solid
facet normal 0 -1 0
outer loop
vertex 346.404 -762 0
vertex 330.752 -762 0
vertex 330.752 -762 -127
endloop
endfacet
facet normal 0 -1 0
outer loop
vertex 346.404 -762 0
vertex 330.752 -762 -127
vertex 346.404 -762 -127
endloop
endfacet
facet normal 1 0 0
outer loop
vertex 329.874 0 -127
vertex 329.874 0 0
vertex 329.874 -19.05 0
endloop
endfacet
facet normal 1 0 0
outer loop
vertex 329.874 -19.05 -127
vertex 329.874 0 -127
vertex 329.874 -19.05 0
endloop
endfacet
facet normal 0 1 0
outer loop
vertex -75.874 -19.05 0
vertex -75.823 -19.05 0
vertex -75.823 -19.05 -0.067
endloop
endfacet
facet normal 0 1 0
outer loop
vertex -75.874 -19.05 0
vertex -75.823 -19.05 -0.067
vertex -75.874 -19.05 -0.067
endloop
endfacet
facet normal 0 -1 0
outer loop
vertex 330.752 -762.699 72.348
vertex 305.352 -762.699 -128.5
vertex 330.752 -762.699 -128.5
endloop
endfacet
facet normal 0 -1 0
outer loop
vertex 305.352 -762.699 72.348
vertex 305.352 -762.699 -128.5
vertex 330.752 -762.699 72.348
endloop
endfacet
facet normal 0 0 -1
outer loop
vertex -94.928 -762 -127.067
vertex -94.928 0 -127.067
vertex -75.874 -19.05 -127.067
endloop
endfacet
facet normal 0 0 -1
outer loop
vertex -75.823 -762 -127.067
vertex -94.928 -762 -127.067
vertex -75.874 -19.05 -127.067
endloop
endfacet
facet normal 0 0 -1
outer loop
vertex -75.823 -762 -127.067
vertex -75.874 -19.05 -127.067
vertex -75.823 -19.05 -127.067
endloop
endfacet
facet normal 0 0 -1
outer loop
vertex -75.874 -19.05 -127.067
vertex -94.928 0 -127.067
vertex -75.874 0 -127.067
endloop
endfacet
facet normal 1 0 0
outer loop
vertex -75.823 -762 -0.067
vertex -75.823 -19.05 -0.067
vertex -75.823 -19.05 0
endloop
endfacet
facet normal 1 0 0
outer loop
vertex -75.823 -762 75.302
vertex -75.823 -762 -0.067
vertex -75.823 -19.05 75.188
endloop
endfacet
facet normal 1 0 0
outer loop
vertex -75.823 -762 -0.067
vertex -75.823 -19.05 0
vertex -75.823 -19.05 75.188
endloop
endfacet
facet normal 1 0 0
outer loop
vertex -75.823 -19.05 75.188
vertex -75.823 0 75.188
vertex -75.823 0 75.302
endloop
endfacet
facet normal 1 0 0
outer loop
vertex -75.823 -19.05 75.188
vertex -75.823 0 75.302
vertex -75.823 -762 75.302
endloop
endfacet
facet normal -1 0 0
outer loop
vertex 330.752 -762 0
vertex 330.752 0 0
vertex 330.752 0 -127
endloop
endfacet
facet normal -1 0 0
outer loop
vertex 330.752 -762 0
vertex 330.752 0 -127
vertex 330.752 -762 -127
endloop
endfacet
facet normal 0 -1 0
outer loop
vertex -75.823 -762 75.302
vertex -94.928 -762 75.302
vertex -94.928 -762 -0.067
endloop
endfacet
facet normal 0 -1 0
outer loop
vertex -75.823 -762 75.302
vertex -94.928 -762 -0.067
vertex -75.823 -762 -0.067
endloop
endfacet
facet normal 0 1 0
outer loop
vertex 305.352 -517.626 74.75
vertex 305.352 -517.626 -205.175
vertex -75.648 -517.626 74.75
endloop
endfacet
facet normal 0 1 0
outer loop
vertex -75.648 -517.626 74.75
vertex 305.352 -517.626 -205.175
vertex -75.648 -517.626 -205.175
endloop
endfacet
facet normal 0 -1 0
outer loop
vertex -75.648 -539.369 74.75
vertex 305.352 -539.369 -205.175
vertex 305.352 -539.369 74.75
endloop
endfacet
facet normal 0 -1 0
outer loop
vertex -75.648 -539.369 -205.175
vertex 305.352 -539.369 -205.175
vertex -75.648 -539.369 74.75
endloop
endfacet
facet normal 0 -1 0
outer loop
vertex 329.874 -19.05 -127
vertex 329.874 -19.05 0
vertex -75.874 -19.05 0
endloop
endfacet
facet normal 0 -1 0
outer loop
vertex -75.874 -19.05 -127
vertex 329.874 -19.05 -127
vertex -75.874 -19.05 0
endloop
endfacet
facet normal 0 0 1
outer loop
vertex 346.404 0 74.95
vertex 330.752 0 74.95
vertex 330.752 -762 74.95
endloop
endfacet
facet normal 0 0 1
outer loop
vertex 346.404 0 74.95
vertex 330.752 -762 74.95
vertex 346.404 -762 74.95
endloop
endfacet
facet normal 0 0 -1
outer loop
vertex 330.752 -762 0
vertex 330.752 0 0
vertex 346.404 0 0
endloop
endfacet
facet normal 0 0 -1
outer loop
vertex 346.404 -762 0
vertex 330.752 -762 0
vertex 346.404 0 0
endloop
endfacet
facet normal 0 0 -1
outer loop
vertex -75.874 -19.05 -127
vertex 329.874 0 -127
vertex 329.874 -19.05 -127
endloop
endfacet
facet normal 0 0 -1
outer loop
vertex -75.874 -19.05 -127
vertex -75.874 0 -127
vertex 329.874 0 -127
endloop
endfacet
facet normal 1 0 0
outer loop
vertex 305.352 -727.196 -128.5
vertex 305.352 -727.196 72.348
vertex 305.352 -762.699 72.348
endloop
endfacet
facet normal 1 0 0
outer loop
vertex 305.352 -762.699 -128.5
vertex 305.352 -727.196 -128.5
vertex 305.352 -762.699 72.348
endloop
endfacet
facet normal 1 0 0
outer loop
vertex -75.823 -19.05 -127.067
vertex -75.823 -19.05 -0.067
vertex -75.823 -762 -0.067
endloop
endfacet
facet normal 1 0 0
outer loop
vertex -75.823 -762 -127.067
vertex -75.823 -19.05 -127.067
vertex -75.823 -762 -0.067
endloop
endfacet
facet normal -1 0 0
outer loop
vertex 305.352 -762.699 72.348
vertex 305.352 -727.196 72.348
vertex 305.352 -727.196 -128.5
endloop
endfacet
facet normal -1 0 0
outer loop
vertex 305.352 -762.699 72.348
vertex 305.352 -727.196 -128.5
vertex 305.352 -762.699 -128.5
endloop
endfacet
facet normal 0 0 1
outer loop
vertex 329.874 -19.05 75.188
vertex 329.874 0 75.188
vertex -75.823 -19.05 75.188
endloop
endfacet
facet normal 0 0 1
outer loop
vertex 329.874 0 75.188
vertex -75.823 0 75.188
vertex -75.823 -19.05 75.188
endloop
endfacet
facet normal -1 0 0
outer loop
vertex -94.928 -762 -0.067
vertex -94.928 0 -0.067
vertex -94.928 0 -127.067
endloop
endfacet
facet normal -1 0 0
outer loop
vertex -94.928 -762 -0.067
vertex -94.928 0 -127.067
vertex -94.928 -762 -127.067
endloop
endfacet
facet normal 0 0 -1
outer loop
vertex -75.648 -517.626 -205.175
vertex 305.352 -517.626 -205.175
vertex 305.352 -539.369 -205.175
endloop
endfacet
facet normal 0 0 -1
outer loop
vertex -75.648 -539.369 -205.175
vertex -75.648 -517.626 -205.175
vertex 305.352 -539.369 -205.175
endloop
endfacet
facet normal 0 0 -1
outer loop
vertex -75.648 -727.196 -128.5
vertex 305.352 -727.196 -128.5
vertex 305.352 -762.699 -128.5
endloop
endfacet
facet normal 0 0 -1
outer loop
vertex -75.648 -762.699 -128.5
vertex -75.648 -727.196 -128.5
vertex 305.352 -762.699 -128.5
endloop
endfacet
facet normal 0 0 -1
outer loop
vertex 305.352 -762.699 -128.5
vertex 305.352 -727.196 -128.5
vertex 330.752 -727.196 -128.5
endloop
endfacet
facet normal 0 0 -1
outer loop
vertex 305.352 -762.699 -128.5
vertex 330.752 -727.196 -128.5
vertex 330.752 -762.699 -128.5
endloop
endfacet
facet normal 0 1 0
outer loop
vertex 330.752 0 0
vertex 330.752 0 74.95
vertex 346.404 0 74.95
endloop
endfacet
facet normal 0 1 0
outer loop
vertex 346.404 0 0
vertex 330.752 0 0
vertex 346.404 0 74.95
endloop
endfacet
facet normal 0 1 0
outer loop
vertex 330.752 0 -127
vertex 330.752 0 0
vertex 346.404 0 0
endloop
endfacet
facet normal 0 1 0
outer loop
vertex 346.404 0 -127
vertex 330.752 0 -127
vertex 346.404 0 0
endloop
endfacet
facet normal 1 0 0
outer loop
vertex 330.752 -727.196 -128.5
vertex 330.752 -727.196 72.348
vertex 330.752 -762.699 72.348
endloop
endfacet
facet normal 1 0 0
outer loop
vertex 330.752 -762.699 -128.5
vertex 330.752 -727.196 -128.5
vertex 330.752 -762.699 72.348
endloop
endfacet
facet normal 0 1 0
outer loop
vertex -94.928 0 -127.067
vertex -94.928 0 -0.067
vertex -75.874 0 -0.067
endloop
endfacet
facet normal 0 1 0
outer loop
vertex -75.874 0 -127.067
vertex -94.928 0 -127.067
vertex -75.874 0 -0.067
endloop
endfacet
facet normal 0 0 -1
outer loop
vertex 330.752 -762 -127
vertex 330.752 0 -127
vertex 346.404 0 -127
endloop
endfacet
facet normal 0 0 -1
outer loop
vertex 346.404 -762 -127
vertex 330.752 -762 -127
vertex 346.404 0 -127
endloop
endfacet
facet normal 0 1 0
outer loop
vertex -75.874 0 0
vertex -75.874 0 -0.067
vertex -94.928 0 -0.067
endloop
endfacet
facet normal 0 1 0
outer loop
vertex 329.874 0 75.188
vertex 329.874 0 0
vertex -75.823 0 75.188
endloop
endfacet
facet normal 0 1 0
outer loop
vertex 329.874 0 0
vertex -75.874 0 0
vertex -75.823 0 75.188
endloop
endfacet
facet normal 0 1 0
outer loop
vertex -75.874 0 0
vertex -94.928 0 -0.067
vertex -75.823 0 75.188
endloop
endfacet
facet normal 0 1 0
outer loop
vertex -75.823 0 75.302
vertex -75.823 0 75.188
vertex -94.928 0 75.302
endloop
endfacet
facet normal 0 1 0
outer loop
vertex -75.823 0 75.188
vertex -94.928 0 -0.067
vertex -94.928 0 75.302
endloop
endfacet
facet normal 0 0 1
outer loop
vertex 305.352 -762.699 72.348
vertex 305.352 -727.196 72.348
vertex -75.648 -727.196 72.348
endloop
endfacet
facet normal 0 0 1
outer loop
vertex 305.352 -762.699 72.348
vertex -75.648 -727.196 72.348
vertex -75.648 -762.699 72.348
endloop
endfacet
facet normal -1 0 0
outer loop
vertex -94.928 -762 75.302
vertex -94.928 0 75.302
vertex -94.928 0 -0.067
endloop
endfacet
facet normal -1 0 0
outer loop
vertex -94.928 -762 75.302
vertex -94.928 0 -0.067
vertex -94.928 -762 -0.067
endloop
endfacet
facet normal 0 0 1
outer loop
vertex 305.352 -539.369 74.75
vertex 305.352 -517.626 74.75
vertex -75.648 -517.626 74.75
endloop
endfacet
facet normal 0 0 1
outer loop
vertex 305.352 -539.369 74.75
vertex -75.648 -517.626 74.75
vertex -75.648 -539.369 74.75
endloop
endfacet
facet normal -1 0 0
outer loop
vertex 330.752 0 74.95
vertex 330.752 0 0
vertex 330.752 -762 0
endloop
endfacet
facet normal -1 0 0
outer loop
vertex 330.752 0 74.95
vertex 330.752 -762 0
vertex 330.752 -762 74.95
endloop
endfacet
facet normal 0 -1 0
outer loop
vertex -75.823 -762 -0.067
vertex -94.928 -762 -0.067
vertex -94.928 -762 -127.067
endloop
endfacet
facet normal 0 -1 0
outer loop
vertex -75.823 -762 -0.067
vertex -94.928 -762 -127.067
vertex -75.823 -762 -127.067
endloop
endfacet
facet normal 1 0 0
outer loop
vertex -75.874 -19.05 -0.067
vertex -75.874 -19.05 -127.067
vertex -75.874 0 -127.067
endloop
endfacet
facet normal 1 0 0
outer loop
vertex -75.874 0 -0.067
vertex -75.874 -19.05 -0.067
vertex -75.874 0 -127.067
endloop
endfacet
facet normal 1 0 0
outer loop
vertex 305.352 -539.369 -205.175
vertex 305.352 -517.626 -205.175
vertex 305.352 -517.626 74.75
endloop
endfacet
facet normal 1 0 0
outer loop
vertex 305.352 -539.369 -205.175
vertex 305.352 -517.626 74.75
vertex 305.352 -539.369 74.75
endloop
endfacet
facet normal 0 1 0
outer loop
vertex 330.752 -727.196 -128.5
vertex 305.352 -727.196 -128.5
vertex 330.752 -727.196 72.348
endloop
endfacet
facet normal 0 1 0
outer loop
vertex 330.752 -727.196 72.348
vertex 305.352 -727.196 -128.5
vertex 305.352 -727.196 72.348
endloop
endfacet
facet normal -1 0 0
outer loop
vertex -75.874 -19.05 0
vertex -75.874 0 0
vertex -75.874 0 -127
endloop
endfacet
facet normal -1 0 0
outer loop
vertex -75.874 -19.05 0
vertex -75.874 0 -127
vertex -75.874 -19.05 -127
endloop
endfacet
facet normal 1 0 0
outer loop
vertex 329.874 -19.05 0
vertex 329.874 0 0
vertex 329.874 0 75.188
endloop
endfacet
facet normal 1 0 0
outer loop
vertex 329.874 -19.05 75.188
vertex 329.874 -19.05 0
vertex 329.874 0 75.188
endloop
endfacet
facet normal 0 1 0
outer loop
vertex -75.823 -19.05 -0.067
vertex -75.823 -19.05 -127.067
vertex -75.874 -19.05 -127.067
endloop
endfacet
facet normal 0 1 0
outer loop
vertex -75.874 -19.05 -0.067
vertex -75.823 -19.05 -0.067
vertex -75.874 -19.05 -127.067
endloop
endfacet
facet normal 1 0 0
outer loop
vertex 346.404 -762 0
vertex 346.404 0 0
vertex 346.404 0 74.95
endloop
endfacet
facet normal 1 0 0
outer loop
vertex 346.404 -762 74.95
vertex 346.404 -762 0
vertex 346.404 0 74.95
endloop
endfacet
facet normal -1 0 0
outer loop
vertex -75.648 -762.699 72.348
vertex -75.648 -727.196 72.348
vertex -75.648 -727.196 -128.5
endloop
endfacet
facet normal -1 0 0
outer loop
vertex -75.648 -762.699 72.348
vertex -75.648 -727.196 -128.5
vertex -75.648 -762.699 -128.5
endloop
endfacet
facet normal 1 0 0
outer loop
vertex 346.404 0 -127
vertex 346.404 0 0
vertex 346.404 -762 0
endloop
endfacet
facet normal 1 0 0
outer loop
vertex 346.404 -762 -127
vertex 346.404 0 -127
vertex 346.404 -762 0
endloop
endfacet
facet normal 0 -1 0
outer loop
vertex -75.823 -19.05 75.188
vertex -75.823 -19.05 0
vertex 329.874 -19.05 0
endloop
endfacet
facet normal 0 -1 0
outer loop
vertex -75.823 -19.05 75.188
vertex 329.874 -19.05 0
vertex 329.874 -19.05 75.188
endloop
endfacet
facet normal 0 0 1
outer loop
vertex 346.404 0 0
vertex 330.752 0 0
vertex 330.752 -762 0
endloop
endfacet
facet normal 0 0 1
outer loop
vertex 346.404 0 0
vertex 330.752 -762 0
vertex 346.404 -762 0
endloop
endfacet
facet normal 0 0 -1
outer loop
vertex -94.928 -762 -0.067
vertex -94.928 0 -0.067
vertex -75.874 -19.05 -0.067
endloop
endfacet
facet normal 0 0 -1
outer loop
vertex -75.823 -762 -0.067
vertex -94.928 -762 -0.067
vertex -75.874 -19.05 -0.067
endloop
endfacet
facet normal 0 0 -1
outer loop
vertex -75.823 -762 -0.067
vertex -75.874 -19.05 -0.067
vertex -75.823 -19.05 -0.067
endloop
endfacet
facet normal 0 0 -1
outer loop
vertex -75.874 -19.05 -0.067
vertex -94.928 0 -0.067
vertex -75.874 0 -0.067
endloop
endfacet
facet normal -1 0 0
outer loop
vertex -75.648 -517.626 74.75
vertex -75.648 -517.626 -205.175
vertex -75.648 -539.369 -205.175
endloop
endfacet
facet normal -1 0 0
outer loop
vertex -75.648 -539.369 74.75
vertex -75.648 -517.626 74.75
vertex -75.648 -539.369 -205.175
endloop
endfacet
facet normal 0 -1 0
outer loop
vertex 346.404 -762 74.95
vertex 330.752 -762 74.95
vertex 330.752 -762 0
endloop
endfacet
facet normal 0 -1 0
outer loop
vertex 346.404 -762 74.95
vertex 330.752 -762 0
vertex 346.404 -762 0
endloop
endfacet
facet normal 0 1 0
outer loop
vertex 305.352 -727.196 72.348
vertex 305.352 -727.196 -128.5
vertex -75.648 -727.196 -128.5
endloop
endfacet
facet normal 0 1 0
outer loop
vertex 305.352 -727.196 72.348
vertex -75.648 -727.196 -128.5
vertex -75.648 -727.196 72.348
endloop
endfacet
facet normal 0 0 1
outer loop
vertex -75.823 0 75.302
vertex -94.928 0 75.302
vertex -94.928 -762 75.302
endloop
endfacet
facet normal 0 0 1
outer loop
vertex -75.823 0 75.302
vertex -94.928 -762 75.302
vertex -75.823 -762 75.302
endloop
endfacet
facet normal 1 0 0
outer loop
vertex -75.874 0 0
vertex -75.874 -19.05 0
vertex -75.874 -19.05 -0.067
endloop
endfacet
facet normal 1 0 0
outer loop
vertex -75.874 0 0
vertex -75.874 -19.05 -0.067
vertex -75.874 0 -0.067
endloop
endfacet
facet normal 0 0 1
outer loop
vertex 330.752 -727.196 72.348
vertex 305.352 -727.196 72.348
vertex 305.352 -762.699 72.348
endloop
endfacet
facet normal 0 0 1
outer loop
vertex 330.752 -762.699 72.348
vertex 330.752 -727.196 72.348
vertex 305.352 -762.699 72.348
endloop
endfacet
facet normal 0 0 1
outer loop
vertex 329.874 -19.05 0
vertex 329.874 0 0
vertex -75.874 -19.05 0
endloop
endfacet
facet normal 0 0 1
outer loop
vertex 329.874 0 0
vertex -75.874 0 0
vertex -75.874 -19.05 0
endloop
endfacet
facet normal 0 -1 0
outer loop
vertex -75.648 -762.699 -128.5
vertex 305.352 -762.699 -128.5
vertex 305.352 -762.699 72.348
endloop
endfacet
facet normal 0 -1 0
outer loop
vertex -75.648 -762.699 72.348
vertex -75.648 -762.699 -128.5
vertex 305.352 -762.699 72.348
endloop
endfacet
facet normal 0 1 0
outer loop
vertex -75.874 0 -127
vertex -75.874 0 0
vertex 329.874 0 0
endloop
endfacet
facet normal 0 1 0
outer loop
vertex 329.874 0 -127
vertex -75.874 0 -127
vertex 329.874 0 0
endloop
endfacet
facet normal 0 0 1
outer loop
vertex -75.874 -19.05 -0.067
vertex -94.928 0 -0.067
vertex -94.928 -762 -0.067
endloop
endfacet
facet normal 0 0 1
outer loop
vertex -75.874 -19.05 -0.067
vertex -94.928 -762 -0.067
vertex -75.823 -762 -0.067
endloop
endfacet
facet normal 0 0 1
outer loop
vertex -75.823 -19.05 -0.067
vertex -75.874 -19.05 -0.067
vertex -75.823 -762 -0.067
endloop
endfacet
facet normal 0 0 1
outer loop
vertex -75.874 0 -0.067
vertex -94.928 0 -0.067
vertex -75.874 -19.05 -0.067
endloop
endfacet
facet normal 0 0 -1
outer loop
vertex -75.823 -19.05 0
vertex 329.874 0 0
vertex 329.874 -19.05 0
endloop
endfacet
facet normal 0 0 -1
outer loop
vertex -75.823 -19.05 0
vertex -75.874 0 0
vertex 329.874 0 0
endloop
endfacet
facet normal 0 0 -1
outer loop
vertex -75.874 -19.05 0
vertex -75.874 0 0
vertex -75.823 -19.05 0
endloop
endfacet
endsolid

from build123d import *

# Parameters (mm, degrees)
F0_W      = 151.7477110028
F0_H      = 75.1876682043
F1_DEPTH  = 19.05
F2_W      = 19.1056653857
F2_H      = 71.5590007603
F3_DEPTH  = 762
F4_DEPTH  = 3.81
F5_DEPTH  = 254
F6_W      = 15.6524479389
F6_H      = 74.9500244856
F7_DEPTH  = 762
F8_DEPTH  = 127
F10_W     = 35.5035066605
F10_H     = 200.8482292295
F11_DEPTH = 381
F12_DEPTH = 25.4
F13_W     = 21.743118763
F13_H     = 279.9243927002
F14_DEPTH = 381
F15_DEPTH = 127


with BuildPart() as f1:
    # F0 (on Front) → F1 (new body)
    with BuildSketch(Plane.XZ):
        with Locations((-1.86265e-05, 37.5938341022)):
            Rectangle(F0_W, F0_H)
    extrude(amount=F1_DEPTH)

    # F2 (on Front) → F3 (join)
    with BuildSketch(Plane.XZ):
        with Locations((-85.3756554425, 39.5220350474)):
            Rectangle(F2_W, F2_H)
    extrude(amount=F3_DEPTH)

    # F4 (add): a face of the model
    f4_faces = [f1.faces().sort_by_distance(p)[0] for p in [
        (-85.3762919221, -381.0248166935, 3.7425346673),
    ]]
    extrude(f4_faces, amount=F4_DEPTH)

    # F5 (add): a face of the model
    f5_faces = [f1.faces().sort_by_distance(p)[0] for p in [
        (75.873836875, -9.525, 37.5938341022),
    ]]
    extrude(f5_faces, amount=F5_DEPTH)


with BuildPart() as f7:
    # F6 (on Front) → F7 (new body)
    with BuildSketch(Plane.XZ):
        with Locations((338.578119874, 37.4750122428)):
            Rectangle(F6_W, F6_H)
    extrude(amount=F7_DEPTH)


with BuildPart() as f8:
    # F8 (new): a face of the model
    f8_faces = [f1.part.faces().sort_by_distance(p)[0] for p in [
        (-85.3762919221, -381.0248166935, -0.0674653327),
    ]]
    extrude(f8_faces, amount=F8_DEPTH)


with BuildPart() as f8b:
    # F8#2 (new): a face of the model
    f8_2_faces = [f1.part.faces().sort_by_distance(p)[0] for p in [
        (126.9999813735, -9.525, 0),
    ]]
    extrude(f8_2_faces, amount=F8_DEPTH)


with BuildPart() as f8c:
    # F8#3 (new): a face of the model
    f8_3_faces = [f7.part.faces().sort_by_distance(p)[0] for p in [
        (338.578119874, -381, 0),
    ]]
    extrude(f8_3_faces, amount=F8_DEPTH)


with BuildPart() as f11:
    # F10 (on offset) → F11 (new body)
    with BuildSketch(Plane(origin=(305.3518959045, 0, 0), x_dir=(0, -1, 0), z_dir=(-1, 0, 0))):
        with Locations((744.9474930763, -28.076287359)):
            Rectangle(F10_W, F10_H)
    extrude(amount=F11_DEPTH)


with BuildPart() as f12:
    # F12 (new): a face of the model
    f12_faces = [f11.part.faces().sort_by_distance(p)[0] for p in [
        (305.3518959045, -744.9474930763, -28.076287359),
    ]]
    extrude(f12_faces, amount=F12_DEPTH)


with BuildPart() as f14:
    # F13 (on offset) → F14 (new body)
    with BuildSketch(Plane(origin=(305.3518959045, 0, 0), x_dir=(0, -1, 0), z_dir=(-1, 0, 0))):
        with Locations((528.4974873066, -65.2126073837)):
            Rectangle(F13_W, F13_H)
    extrude(amount=F14_DEPTH)

    # F15 (add): a face of the model
    f15_faces = [f14.faces().sort_by_distance(p)[0] for p in [
        (114.8518959045, -528.4974873066, -205.1748037338),
    ]]
    extrude(f15_faces, amount=-F15_DEPTH)


solid = Compound([f1.part, f7.part, f8.part, f8b.part, f8c.part, f11.part, f12.part, f14.part])
